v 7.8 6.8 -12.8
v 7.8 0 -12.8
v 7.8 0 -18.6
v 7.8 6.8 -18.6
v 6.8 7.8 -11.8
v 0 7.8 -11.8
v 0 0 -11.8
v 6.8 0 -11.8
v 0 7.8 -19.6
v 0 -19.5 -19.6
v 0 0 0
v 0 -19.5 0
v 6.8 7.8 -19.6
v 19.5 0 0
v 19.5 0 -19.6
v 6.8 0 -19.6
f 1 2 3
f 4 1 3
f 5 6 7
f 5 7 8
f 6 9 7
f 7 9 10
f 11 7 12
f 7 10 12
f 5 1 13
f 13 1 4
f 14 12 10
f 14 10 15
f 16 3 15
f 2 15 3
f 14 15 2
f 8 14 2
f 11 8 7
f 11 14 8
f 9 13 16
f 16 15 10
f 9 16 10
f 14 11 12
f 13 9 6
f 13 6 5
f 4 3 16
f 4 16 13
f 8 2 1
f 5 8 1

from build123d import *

# Parameters (mm, degrees)
BOSS_EXTRUDE1_DEPTH = 19.6
BOSS_EXTRUDE4_DEPTH = 7.8
CHAMFER3_SIZE       = 1


with BuildPart() as part:
    # Sketch1 → Boss-Extrude1 (new body)
    with BuildSketch(Plane.XY):
        Polygon((0, 0), (0, -19.5), (19.5, 0), align=None)
    extrude(amount=-BOSS_EXTRUDE1_DEPTH)

    # Sketch2 → Boss-Extrude4 (add)
    with BuildSketch(Plane(origin=(0, 0, 0), x_dir=(1, 0, 0), z_dir=(0, 1, 0))):
        Polygon((7.8, 19.6), (0, 19.6), (0, 13.7), (0, 11.8), (7.8, 11.8), align=None)
    extrude(amount=BOSS_EXTRUDE4_DEPTH)

    # Chamfer3
    chamfer3_edges = [part.edges().sort_by_distance(p)[0] for p in [
        (7.8, 3.9, -11.8),
        (7.8, 3.9, -19.6),
        (7.8, 7.8, -15.7),
    ]]
    chamfer(chamfer3_edges, length=CHAMFER3_SIZE)


solid = part.part
